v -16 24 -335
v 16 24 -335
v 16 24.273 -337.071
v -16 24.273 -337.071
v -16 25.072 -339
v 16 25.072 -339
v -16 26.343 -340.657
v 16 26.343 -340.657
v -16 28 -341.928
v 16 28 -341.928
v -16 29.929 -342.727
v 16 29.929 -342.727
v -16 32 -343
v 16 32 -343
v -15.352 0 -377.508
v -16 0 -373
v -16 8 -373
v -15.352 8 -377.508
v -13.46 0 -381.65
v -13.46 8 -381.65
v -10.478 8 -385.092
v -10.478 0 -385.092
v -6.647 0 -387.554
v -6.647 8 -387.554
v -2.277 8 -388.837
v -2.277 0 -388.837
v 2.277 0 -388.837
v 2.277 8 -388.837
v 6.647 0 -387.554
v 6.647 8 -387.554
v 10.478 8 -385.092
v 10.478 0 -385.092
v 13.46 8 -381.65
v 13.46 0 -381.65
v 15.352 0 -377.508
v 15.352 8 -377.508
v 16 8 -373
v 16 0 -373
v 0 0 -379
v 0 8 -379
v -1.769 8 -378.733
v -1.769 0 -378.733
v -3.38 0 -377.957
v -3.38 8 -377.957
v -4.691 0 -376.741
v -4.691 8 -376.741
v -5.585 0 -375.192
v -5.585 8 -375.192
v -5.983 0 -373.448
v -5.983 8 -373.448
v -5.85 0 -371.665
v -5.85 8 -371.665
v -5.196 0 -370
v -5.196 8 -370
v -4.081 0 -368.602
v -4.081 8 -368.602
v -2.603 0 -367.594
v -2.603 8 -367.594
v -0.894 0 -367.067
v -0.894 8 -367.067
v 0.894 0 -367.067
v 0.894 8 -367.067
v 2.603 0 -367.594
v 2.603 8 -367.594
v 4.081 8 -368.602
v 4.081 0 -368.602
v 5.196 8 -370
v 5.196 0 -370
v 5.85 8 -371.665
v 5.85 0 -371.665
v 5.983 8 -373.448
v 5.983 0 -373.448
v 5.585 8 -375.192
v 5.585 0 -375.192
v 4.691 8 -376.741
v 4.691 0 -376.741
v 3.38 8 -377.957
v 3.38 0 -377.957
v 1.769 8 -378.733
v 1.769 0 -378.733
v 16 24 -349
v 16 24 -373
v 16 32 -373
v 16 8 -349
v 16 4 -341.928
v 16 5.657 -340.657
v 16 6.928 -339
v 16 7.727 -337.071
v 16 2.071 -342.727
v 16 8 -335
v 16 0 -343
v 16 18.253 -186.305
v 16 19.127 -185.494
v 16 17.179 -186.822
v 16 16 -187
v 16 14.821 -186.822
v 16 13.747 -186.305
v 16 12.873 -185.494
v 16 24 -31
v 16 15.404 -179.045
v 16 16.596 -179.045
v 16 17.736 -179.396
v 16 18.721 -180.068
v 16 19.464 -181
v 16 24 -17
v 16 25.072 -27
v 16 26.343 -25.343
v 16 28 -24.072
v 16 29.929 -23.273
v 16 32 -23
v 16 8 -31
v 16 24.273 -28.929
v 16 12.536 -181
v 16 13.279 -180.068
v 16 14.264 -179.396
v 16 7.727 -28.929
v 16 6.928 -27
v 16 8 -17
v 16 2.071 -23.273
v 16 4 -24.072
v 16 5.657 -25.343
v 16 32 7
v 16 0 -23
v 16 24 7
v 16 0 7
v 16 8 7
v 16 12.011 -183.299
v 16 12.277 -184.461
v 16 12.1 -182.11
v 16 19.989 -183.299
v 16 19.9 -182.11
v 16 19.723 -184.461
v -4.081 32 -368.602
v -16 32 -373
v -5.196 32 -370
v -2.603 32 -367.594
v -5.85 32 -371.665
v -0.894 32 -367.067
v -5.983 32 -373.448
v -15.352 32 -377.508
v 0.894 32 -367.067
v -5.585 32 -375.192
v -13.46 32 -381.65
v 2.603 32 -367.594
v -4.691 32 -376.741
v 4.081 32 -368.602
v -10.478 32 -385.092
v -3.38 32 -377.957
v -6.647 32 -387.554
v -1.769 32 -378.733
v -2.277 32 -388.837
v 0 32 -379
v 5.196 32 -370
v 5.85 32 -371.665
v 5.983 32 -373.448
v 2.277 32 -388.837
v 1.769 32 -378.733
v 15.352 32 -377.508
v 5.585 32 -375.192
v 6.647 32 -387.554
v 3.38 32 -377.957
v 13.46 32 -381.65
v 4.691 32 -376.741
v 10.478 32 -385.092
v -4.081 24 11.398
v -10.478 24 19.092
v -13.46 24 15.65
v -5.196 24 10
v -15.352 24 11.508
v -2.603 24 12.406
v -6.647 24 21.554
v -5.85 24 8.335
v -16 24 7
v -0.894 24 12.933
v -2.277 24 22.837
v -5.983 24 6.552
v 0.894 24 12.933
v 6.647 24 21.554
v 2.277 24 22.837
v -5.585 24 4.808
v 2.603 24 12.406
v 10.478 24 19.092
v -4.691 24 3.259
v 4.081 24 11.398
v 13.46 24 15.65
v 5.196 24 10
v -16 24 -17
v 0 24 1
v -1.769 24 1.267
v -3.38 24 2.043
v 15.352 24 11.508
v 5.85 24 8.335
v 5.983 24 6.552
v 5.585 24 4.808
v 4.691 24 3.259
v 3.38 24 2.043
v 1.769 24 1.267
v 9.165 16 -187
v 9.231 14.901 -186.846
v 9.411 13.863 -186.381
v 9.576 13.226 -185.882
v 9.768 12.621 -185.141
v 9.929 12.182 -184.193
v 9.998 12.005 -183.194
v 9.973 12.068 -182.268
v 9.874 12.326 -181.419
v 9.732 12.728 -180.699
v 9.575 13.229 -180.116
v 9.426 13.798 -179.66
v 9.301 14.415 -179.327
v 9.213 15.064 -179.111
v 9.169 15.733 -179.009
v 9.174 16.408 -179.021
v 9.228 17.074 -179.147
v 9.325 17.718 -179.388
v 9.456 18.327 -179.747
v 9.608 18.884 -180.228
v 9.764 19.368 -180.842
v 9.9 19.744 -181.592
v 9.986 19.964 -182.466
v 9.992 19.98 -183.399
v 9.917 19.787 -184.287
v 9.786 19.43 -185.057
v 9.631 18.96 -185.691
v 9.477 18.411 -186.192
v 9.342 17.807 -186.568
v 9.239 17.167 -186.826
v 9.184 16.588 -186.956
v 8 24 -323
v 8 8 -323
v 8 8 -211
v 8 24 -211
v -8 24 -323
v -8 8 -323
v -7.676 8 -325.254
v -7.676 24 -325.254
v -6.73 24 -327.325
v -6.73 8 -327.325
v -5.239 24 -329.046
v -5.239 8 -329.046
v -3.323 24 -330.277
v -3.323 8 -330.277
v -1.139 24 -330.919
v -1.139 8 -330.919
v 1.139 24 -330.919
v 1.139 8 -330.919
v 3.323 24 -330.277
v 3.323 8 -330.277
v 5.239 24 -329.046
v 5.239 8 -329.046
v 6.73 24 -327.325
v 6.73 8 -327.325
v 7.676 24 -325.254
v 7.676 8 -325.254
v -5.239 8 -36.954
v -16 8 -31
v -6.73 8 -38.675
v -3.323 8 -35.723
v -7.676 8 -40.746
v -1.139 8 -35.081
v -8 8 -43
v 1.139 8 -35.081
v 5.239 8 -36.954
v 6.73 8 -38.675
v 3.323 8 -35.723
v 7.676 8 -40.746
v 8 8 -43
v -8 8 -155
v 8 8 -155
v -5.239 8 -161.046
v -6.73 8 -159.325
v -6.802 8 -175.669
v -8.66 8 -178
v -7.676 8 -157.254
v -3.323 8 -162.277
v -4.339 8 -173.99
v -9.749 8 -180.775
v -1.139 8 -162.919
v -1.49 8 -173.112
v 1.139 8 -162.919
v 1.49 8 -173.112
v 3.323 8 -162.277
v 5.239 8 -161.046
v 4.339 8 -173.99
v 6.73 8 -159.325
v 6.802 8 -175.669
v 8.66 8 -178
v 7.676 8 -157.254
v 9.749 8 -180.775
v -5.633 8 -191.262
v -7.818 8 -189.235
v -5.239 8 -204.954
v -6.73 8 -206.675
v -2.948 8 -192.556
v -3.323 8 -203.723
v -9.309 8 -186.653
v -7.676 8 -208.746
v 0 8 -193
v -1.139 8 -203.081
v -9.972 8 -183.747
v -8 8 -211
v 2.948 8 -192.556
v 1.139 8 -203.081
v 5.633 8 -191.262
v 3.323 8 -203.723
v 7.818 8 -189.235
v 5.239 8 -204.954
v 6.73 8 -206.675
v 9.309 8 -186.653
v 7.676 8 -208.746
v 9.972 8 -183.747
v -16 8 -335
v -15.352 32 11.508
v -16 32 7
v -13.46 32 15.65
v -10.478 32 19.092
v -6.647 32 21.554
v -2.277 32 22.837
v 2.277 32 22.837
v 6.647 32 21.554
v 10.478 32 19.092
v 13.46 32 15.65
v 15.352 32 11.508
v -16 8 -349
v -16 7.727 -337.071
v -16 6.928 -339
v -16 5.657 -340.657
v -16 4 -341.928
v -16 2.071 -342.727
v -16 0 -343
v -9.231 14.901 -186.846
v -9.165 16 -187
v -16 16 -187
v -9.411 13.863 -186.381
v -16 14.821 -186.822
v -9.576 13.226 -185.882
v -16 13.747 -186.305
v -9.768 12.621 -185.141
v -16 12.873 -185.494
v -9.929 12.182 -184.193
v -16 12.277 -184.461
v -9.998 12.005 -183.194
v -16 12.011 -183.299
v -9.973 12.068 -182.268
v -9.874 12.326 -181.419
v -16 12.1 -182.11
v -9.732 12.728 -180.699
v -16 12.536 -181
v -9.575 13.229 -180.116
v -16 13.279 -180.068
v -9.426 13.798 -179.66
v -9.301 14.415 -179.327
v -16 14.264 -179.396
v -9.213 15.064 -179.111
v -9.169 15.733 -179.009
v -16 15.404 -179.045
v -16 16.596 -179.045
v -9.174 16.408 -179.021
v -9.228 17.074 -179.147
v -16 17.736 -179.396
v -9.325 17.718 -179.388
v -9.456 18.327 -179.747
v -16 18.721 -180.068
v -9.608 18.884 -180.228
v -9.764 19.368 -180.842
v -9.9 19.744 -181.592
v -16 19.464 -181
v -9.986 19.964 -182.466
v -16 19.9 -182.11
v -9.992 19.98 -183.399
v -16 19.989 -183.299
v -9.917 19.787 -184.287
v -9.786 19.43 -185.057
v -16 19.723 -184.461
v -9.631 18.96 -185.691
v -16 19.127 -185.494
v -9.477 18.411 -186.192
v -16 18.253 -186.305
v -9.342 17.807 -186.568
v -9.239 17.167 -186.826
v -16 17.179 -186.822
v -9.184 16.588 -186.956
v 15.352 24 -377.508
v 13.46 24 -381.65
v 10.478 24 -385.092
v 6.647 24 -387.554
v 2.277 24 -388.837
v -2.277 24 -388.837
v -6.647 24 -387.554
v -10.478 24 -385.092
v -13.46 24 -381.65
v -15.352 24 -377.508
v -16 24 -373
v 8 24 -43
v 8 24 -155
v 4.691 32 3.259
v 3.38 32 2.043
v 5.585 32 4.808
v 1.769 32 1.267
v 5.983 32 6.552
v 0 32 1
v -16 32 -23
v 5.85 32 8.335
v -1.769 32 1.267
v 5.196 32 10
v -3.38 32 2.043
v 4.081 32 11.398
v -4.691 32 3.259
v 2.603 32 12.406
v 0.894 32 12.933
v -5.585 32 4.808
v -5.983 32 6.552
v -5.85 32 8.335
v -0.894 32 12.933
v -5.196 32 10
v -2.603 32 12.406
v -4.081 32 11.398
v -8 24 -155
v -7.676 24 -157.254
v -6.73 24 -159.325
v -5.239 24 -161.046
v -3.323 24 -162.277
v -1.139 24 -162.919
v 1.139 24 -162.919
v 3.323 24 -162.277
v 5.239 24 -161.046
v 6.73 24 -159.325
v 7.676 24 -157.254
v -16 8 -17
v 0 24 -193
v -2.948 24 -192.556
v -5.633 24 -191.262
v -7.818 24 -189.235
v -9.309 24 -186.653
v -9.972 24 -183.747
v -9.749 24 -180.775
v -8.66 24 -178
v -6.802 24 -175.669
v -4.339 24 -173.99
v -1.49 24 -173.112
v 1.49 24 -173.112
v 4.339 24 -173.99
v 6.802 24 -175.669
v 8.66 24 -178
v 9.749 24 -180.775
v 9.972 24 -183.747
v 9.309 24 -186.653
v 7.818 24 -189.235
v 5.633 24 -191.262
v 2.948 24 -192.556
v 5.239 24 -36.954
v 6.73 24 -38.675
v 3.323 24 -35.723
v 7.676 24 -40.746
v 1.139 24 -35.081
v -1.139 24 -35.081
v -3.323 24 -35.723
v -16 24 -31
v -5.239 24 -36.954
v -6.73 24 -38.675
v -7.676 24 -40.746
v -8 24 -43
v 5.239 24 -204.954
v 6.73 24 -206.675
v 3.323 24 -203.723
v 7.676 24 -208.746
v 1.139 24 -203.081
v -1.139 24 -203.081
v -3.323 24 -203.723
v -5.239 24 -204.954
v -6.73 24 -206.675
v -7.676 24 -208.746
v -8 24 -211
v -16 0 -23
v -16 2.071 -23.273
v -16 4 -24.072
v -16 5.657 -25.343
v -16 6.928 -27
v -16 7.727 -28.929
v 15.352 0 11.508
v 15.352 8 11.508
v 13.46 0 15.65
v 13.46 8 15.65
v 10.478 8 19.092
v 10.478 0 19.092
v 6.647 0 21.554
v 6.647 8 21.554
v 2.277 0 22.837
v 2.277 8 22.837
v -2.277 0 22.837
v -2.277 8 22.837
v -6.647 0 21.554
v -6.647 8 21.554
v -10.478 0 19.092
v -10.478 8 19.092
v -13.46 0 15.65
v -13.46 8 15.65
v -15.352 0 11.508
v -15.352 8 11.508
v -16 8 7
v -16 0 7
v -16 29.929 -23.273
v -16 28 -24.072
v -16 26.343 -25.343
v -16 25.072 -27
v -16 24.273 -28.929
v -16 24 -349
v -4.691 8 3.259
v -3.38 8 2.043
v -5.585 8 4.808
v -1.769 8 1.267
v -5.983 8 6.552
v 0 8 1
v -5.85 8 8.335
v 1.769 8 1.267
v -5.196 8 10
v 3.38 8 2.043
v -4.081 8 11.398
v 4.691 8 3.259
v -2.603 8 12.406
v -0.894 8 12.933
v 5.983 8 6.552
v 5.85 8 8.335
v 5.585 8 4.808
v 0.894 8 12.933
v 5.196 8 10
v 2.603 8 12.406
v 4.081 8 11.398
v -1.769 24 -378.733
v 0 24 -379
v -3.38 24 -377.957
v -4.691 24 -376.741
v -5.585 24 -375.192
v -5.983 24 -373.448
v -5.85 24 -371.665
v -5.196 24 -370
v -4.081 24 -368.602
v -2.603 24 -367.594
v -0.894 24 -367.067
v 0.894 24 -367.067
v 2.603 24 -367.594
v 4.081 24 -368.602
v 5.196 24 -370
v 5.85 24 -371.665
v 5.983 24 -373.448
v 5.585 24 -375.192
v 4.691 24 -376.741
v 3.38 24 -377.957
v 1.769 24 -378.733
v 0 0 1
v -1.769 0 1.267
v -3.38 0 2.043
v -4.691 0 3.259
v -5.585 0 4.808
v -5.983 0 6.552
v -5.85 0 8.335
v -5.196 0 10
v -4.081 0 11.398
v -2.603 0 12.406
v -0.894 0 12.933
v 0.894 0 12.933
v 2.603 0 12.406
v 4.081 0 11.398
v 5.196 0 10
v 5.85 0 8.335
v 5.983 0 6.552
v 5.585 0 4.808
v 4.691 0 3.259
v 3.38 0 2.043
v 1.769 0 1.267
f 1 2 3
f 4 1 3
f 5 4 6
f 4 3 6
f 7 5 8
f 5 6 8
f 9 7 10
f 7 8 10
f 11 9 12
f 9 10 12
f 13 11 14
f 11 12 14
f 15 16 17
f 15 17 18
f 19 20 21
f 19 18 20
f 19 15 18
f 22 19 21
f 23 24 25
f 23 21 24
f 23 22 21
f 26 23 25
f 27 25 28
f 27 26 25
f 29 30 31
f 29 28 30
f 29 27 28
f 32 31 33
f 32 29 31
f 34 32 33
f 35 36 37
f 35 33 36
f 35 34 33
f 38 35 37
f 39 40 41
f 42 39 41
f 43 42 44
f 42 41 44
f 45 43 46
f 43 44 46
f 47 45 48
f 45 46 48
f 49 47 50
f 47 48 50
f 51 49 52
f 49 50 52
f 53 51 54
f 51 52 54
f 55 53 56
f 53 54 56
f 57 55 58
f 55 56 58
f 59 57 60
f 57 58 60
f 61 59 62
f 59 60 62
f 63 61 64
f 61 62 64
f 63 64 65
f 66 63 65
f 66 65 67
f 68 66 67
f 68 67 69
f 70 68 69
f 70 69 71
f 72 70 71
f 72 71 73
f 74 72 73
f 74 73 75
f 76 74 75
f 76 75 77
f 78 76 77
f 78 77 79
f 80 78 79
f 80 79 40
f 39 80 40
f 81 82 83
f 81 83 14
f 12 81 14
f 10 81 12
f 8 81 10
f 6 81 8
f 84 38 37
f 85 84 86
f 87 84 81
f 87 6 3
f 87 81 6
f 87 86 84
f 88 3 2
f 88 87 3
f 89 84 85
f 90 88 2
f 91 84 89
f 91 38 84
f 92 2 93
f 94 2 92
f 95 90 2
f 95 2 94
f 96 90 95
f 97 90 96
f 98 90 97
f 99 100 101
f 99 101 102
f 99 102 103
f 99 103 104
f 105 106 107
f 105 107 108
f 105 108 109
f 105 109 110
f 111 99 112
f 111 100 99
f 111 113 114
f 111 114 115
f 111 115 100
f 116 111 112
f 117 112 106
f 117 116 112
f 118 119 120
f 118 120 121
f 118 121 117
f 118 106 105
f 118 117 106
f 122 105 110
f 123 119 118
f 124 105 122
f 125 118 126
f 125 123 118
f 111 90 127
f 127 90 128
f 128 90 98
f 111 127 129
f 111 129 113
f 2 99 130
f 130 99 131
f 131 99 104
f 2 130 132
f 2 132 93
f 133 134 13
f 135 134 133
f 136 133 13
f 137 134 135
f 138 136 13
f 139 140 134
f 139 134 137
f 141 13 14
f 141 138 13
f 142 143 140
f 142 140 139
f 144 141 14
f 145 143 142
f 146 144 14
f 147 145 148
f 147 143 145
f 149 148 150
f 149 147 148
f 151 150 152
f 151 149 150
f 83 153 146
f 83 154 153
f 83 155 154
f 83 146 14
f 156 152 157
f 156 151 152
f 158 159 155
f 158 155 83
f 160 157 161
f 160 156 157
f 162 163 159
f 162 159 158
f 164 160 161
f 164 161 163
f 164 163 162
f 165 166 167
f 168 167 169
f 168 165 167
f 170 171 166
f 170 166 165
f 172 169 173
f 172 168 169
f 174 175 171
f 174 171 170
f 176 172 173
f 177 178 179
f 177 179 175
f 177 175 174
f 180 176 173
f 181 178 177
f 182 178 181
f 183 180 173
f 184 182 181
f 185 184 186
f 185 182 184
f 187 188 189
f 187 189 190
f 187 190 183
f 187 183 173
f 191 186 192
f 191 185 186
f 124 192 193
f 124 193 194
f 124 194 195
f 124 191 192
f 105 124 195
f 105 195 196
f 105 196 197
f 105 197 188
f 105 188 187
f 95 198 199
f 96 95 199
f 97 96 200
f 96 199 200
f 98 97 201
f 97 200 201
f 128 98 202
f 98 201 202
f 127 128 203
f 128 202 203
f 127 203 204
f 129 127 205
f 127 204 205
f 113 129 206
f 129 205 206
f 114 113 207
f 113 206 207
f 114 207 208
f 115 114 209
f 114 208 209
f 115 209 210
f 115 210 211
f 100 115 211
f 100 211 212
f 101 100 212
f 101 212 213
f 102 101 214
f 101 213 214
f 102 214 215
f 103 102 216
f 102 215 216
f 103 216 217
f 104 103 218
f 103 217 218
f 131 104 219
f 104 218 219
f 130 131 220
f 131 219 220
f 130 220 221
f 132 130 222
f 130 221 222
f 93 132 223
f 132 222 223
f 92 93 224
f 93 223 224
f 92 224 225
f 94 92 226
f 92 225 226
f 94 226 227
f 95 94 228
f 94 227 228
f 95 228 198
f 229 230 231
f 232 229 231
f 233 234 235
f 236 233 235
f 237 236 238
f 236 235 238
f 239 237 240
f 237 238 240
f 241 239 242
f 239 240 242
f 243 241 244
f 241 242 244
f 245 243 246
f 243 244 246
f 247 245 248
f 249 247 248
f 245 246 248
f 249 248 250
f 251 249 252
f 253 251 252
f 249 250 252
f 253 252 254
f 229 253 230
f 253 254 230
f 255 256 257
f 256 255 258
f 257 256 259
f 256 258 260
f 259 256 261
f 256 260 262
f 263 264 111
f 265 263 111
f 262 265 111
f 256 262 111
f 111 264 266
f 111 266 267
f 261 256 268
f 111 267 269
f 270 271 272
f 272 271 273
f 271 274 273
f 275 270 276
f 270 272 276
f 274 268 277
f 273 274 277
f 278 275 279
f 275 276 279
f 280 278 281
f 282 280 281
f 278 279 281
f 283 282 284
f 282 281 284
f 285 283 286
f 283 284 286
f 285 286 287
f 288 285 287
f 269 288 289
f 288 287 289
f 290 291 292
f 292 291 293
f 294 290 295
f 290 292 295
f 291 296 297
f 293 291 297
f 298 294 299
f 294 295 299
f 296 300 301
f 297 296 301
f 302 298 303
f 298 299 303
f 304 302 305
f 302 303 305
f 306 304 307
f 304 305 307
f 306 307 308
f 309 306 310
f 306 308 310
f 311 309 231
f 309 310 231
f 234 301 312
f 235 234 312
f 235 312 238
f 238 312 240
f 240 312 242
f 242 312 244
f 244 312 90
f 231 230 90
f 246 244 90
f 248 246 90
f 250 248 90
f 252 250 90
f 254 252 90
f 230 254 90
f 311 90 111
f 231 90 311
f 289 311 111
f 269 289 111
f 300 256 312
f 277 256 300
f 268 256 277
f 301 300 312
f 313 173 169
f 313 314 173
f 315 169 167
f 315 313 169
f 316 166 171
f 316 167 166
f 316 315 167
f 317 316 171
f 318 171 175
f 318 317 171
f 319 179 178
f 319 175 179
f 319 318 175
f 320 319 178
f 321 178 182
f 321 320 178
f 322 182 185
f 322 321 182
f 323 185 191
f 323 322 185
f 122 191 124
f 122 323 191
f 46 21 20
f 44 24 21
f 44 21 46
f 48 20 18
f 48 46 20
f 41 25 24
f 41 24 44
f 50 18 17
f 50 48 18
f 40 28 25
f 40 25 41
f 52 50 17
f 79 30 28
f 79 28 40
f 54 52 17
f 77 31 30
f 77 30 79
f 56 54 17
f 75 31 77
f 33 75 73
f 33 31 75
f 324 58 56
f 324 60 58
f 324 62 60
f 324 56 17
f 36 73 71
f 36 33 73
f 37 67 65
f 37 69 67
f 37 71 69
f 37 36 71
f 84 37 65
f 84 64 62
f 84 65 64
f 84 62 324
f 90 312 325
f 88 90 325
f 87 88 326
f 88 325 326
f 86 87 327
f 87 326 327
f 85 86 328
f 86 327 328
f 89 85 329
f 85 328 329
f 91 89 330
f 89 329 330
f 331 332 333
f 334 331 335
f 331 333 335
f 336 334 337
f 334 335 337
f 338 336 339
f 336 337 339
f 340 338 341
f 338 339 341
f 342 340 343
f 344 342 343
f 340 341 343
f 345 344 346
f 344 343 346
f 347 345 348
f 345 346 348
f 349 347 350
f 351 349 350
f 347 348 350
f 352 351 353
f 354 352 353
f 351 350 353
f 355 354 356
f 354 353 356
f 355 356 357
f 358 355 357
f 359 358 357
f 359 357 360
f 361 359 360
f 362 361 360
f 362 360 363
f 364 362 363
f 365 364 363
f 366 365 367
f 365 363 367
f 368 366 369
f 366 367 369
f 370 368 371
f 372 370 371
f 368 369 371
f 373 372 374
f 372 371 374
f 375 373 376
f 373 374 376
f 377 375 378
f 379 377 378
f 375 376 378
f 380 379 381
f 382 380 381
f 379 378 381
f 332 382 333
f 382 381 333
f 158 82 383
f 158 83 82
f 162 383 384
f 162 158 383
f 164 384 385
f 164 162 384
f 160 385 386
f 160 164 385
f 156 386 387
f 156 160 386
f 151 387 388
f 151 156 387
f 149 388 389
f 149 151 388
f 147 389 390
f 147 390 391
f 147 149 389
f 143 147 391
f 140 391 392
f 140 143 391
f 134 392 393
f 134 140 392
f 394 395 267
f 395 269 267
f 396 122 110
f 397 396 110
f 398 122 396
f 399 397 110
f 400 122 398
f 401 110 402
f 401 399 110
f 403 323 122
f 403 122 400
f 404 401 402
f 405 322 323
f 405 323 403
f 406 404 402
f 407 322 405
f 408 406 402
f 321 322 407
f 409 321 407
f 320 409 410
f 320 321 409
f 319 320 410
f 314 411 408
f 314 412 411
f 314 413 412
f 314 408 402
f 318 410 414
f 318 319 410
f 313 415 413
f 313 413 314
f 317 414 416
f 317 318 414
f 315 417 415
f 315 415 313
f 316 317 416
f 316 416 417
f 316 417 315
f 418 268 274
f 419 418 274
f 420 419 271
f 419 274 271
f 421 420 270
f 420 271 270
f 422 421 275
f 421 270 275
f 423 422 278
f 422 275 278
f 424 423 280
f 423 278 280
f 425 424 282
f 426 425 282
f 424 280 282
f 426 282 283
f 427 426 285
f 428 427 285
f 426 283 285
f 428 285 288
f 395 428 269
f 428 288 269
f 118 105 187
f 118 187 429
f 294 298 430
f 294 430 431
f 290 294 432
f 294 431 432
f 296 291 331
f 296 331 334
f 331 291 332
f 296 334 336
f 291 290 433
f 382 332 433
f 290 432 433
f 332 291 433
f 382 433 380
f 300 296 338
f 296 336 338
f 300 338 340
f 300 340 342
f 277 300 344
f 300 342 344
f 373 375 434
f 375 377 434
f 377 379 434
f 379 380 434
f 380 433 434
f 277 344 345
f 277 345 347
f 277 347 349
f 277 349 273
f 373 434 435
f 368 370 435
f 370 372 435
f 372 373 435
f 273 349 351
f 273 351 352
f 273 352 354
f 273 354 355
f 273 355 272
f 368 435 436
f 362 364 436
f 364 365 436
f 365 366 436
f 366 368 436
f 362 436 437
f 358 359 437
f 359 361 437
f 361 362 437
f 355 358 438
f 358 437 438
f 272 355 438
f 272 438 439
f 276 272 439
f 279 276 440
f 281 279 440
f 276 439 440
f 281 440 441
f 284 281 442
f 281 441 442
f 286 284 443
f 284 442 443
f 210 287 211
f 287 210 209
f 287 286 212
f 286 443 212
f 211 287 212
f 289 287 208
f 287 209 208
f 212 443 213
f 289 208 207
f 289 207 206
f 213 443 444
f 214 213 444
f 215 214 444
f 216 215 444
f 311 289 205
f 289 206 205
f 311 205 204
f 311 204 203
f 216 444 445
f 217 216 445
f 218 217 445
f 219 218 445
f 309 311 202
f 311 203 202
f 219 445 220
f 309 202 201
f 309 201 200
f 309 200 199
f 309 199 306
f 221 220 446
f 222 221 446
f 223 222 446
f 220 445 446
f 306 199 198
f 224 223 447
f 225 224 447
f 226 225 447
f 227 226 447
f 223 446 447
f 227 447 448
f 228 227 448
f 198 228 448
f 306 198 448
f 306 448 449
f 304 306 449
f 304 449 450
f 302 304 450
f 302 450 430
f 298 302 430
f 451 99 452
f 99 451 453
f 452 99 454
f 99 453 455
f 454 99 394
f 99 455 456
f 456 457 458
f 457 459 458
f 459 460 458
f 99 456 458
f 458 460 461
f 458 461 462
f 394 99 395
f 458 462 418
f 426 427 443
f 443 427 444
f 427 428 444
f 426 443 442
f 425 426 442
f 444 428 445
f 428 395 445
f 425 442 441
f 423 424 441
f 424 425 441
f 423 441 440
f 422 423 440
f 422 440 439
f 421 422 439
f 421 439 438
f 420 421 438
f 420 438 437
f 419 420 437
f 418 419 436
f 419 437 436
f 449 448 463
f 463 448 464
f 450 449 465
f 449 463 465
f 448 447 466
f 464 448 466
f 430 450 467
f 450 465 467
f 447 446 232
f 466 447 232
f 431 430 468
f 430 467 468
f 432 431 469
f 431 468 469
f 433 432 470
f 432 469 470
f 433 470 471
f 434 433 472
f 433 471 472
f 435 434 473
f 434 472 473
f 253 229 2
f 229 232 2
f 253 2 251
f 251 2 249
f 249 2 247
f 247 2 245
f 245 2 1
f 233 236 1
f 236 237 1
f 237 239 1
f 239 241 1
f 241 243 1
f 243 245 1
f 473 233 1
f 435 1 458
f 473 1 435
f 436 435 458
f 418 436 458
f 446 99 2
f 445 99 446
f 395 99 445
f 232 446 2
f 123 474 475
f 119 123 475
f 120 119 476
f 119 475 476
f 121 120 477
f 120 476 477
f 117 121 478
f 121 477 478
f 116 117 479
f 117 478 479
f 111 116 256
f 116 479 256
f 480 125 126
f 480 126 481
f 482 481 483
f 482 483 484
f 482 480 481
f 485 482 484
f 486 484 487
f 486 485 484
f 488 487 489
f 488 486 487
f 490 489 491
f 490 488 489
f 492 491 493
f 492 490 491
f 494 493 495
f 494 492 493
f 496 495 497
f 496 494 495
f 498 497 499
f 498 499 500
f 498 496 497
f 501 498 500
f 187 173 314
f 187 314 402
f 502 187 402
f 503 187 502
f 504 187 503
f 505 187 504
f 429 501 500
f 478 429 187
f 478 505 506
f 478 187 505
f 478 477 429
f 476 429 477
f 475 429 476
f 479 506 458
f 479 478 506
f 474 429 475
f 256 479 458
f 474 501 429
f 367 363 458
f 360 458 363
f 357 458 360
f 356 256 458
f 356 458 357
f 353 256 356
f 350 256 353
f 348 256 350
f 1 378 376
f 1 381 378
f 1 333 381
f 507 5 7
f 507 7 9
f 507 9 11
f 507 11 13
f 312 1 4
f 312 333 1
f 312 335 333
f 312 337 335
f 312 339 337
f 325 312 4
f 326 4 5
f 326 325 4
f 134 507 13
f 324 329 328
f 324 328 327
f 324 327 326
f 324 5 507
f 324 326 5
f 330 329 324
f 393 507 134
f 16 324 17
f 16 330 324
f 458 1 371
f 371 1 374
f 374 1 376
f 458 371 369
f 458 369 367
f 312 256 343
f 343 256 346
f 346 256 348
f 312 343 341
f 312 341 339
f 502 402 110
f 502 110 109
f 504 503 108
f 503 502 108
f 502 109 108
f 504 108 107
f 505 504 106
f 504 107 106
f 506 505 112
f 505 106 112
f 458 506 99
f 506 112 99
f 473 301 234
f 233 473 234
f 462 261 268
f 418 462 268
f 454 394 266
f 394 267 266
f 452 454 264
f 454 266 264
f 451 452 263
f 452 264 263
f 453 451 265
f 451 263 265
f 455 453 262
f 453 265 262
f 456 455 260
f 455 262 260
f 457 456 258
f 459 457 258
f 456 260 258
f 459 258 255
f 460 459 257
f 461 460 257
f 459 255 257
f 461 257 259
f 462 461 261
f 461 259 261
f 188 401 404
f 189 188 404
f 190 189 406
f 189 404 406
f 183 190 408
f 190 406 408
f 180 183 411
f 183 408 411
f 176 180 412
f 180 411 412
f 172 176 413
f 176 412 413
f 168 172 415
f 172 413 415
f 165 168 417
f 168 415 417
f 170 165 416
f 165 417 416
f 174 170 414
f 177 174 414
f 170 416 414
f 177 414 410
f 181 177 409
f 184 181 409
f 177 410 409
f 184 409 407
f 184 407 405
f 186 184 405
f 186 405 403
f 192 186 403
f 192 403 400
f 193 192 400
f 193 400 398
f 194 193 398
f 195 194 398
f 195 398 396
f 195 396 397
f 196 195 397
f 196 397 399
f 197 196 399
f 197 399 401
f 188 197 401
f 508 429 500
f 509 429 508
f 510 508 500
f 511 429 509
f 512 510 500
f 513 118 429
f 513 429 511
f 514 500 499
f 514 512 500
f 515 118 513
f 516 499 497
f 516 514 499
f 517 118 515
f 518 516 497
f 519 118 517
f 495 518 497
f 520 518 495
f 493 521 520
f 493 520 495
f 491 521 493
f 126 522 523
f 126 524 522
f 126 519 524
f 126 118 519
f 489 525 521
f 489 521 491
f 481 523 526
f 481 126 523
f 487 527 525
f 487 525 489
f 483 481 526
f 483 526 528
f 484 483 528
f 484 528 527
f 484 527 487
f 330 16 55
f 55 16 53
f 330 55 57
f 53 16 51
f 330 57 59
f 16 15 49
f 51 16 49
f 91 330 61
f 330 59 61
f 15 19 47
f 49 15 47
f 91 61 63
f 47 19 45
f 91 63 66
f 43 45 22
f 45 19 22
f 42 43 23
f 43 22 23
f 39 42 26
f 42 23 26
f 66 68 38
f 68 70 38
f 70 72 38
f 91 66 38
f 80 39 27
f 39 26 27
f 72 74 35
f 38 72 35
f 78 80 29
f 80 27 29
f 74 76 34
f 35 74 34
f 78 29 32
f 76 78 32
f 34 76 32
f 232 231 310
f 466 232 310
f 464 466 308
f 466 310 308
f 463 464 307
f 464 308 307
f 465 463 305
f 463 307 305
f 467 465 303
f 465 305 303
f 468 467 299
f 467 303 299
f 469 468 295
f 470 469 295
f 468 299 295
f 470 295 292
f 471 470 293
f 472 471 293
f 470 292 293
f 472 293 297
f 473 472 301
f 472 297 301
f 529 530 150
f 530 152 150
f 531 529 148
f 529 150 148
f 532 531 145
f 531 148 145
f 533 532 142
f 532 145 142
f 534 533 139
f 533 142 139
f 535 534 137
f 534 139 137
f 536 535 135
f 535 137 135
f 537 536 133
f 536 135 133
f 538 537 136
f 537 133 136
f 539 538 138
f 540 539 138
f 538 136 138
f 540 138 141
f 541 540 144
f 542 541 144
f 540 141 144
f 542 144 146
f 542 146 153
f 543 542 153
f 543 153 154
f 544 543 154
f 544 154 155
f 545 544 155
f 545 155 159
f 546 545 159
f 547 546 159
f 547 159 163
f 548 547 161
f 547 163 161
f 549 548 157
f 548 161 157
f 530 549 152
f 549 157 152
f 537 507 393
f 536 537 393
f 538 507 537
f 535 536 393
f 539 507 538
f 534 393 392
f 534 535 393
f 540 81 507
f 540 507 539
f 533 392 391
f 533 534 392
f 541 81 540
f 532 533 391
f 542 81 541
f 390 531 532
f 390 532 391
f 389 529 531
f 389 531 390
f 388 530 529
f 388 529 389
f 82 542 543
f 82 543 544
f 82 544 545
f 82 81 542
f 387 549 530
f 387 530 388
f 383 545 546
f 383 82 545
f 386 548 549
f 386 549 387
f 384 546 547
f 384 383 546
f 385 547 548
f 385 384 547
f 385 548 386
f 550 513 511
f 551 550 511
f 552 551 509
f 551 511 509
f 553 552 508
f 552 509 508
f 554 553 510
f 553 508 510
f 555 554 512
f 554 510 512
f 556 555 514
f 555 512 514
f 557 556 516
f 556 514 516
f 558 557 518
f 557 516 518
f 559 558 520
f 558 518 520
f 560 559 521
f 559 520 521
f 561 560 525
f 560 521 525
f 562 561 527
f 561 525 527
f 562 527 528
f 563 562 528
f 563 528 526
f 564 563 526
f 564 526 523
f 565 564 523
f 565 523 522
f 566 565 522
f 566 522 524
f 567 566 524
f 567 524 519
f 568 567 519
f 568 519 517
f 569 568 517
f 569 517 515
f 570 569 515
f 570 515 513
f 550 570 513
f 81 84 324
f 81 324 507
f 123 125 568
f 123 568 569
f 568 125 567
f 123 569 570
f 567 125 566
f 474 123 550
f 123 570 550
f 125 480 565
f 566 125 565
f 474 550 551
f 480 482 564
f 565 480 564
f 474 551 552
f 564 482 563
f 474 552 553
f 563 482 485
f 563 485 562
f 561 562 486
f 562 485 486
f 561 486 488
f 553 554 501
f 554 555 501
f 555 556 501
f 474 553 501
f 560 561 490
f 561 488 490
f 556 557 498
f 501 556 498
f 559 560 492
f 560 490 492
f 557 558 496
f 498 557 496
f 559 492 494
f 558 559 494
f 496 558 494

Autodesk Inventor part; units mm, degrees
ref_plane "YZ Plane" through (0, 0, 0) normal (1, 0, 0) x (0, 1, 0)
sketch "Skizze1" plane through (0, 0, 0) normal (0, 1, 0) x (-1, 0, 0)
  line L0 (-16, 23) -> (16, 23)
  line L1 (16, 23) -> (16, -23)
  line L2 (16, -23) -> (-16, -23)
  line L3 (-16, -23) -> (-16, 23)
  line L4 (-16, 23) -> (16, -23) construction
  line L5 (16, 23) -> (-16, -23) construction
  point P0 (0, 0)
  dimension "d0" = 46
  dimension "d1" = 32
extrude "Extrusion1" add sketch "Skizze1" along normal blind 32
sketch "Skizze2" plane through (16, 0, -23) normal (0, 0, -1) x (-1, 0, 0)
  line L0 (0, 0) -> (0, 32) projected
  line L1 (0, 0) -> (32, 0) projected
  line L2 (32, 24) -> (0, 24)
  line L3 (0, 24) -> (0, 8)
  line L4 (0, 8) -> (32, 8)
  line L5 (32, 8) -> (32, 24)
  point P0 (16, 0)
  point P1 (0, 16)
  point P2 (16, 0)
  point P3 (16, 0)
  point P4 (0, 16)
  point P5 (16, 8)
  point P6 (16, 0)
  point P7 (0, 16)
  point P8 (0, 24)
  point P9 (0, 8)
  dimension "d51" = 16
extrude "Extrusion2" add sketch "Skizze2" along normal blind 160
sketch "Skizze4" plane through (16, 0, 23) normal (1, 0, 0) x (0, 0, -1)
  line L0 (0, 24) -> (40, 24)
  line L1 (40, 24) -> (40, 8)
  line L2 (40, 8) -> (0, 8)
  line L3 (0, 8) -> (0, 24)
  line L4 (0, 0) -> (0, 32) projected
  point P0 (23, 0)
  point P1 (0, 16)
  dimension "d14" = 16
  dimension "d15" = 40
extrude "Extrusion4" cut sketch "Skizze4" against normal up to surface (32 mm away)
fillet "Rundung2" radius 8 2 edges at (0, 24, -23) (0, 8, -23)
ref_plane "Arbeitsebene1" through (16, 0, -183) normal (0, 0, -1) x (-1, 0, 0)
mirror "Spiegeln1" about plane through (16, 0, -183) normal (0, 0, -1) of "Extrusion2", "Extrusion1", "Extrusion4"
fillet "Rundung4" radius 8 2 edges at (0, 24, -343) (0, 8, -343)
sketch "Skizze7" plane through (16, 32, 0) normal (1, 0, 0) x (0, -1, 0)
  line L0 (24, 17) -> (24, 17) projected
  line L1 (8, 17) -> (24, 17) projected
  line L2 (8, 31) -> (8, 335) projected
  point P0 (16, 183)
  point P1 (-9.4065, 183)
  point P2 (16, 17)
  point P3 (8, 183)
hole "Bohrung3" at (16, 16, -183) direction (-1, 0, 0) diameter 8 end through all
sketch "Skizze8" plane through (8, 8, -31) normal (0, -1, 0) x (0, 0, -1)
  line L0 (12, -8) -> (124, -8) construction
  line L1 (12, -16) -> (124, -16)
  line L2 (124, 0) -> (12, 0)
  arc A0 (12, 0) -> (12, -16) centre (12, -8) ccw
  arc A1 (124, -16) -> (124, 0) centre (124, -8) ccw
  line L3 (180, -8) -> (292, -8) construction
  line L4 (180, -16) -> (292, -16)
  line L5 (292, 0) -> (180, 0)
  arc A2 (180, 0) -> (180, -16) centre (180, -8) ccw
  arc A3 (292, -16) -> (292, 0) centre (292, -8) ccw
  line L6 (0, -24) -> (0, 8) projected
  line L7 (304, 8) -> (304, -24) projected
  line L8 (0, 8) -> (304, 8) projected
  point P0 (-31, 0)
  point P1 (68, -8)
  point P2 (236, -8)
  point P3 (0, -8)
  point P4 (304, -8)
  point P5 (152, -8)
  point P6 (152, 8)
  point P7 (0, -8)
  dimension "d43" = 112
  dimension "d46" = 112
  dimension "d47" = 16
  dimension "d48" = 16
  dimension "d55" = 28
  dimension "d56" = 28
extrude "Extrusion5" cut sketch "Skizze8" against normal up to surface (16 mm away)
sketch "Skizze9" plane through (0, 0, 0) normal (0, -1, 0) x (1, 0, 0)
  line L0 (-16, 23) -> (16, 23) projected
  arc A0 (8, -43) -> (-8, -43) centre (0, -43) ccw projected
  arc A1 (-8, -323) -> (8, -323) centre (0, -323) ccw projected
  point P0 (0, 0)
  point P1 (0, 7)
  point P2 (0, -373)
  point P3 (0, 23)
  dimension "d64" = 50
  dimension "d65" = 50
hole "Bohrung4" at (0, 0, 7) at (0, 0, -373) direction (0, 1, 0) diameter 12 depth 32
sketch "Skizze10" plane through (-16, 8, -31) normal (0, -1, 0) x (1, 0, 0)
  line L0 (32, 8) -> (0, 8) projected
  line L1 (32, 0) -> (32, -304) projected
  point P0 (16, 31)
  point P1 (16, -152)
  point P2 (16, 8)
  point P3 (32, -152)
hole "Bohrung5" at (0, 8, -183) direction (0, 1, 0) diameter 20 depth 16
sketch "Skizze11" plane through (-16, 0, -389) normal (0, -1, 0) x (1, 0, 0)
  circle A0 centre (16, 16) radius 6 projected
  line L0 (0, 46) -> (0, 0) projected
  line L1 (32, 0) -> (32, 46) projected
  arc A1 (0, 16) -> (32, 16) centre (16, 16) ccw
  line L2 (32, 16) -> (0, 16)
  line L3 (0, 0) -> (32, 0) projected
  arc A2 (8, 66) -> (24, 66) centre (16, 66) ccw projected
  point P0 (16, 389)
  point P1 (16, 0)
  point P2 (16, 0)
  point P3 (16, 0)
  dimension "d73" = 16
  dimension "d74" = 50
extrude "Extrusion6" cut sketch "Skizze11" against normal up to surface (8 mm away) contours L1 L3 A1 | A1 L3 L0
ref_plane "Arbeitsebene2" through (0, 16, 0) normal (0, 1, 0) x (-1, 0, 0)
mirror "Spiegeln2" about plane through (0, 16, 0) normal (0, 1, 0) of "Extrusion6"
mirror "Spiegeln3" about plane through (16, 0, -183) normal (0, 0, -1) of "Extrusion6", "Spiegeln2"
equation "\"d48\" = d47"
equation "\"d56\" = d55"
properties part number "16" material "Kupfer, Legierung"
